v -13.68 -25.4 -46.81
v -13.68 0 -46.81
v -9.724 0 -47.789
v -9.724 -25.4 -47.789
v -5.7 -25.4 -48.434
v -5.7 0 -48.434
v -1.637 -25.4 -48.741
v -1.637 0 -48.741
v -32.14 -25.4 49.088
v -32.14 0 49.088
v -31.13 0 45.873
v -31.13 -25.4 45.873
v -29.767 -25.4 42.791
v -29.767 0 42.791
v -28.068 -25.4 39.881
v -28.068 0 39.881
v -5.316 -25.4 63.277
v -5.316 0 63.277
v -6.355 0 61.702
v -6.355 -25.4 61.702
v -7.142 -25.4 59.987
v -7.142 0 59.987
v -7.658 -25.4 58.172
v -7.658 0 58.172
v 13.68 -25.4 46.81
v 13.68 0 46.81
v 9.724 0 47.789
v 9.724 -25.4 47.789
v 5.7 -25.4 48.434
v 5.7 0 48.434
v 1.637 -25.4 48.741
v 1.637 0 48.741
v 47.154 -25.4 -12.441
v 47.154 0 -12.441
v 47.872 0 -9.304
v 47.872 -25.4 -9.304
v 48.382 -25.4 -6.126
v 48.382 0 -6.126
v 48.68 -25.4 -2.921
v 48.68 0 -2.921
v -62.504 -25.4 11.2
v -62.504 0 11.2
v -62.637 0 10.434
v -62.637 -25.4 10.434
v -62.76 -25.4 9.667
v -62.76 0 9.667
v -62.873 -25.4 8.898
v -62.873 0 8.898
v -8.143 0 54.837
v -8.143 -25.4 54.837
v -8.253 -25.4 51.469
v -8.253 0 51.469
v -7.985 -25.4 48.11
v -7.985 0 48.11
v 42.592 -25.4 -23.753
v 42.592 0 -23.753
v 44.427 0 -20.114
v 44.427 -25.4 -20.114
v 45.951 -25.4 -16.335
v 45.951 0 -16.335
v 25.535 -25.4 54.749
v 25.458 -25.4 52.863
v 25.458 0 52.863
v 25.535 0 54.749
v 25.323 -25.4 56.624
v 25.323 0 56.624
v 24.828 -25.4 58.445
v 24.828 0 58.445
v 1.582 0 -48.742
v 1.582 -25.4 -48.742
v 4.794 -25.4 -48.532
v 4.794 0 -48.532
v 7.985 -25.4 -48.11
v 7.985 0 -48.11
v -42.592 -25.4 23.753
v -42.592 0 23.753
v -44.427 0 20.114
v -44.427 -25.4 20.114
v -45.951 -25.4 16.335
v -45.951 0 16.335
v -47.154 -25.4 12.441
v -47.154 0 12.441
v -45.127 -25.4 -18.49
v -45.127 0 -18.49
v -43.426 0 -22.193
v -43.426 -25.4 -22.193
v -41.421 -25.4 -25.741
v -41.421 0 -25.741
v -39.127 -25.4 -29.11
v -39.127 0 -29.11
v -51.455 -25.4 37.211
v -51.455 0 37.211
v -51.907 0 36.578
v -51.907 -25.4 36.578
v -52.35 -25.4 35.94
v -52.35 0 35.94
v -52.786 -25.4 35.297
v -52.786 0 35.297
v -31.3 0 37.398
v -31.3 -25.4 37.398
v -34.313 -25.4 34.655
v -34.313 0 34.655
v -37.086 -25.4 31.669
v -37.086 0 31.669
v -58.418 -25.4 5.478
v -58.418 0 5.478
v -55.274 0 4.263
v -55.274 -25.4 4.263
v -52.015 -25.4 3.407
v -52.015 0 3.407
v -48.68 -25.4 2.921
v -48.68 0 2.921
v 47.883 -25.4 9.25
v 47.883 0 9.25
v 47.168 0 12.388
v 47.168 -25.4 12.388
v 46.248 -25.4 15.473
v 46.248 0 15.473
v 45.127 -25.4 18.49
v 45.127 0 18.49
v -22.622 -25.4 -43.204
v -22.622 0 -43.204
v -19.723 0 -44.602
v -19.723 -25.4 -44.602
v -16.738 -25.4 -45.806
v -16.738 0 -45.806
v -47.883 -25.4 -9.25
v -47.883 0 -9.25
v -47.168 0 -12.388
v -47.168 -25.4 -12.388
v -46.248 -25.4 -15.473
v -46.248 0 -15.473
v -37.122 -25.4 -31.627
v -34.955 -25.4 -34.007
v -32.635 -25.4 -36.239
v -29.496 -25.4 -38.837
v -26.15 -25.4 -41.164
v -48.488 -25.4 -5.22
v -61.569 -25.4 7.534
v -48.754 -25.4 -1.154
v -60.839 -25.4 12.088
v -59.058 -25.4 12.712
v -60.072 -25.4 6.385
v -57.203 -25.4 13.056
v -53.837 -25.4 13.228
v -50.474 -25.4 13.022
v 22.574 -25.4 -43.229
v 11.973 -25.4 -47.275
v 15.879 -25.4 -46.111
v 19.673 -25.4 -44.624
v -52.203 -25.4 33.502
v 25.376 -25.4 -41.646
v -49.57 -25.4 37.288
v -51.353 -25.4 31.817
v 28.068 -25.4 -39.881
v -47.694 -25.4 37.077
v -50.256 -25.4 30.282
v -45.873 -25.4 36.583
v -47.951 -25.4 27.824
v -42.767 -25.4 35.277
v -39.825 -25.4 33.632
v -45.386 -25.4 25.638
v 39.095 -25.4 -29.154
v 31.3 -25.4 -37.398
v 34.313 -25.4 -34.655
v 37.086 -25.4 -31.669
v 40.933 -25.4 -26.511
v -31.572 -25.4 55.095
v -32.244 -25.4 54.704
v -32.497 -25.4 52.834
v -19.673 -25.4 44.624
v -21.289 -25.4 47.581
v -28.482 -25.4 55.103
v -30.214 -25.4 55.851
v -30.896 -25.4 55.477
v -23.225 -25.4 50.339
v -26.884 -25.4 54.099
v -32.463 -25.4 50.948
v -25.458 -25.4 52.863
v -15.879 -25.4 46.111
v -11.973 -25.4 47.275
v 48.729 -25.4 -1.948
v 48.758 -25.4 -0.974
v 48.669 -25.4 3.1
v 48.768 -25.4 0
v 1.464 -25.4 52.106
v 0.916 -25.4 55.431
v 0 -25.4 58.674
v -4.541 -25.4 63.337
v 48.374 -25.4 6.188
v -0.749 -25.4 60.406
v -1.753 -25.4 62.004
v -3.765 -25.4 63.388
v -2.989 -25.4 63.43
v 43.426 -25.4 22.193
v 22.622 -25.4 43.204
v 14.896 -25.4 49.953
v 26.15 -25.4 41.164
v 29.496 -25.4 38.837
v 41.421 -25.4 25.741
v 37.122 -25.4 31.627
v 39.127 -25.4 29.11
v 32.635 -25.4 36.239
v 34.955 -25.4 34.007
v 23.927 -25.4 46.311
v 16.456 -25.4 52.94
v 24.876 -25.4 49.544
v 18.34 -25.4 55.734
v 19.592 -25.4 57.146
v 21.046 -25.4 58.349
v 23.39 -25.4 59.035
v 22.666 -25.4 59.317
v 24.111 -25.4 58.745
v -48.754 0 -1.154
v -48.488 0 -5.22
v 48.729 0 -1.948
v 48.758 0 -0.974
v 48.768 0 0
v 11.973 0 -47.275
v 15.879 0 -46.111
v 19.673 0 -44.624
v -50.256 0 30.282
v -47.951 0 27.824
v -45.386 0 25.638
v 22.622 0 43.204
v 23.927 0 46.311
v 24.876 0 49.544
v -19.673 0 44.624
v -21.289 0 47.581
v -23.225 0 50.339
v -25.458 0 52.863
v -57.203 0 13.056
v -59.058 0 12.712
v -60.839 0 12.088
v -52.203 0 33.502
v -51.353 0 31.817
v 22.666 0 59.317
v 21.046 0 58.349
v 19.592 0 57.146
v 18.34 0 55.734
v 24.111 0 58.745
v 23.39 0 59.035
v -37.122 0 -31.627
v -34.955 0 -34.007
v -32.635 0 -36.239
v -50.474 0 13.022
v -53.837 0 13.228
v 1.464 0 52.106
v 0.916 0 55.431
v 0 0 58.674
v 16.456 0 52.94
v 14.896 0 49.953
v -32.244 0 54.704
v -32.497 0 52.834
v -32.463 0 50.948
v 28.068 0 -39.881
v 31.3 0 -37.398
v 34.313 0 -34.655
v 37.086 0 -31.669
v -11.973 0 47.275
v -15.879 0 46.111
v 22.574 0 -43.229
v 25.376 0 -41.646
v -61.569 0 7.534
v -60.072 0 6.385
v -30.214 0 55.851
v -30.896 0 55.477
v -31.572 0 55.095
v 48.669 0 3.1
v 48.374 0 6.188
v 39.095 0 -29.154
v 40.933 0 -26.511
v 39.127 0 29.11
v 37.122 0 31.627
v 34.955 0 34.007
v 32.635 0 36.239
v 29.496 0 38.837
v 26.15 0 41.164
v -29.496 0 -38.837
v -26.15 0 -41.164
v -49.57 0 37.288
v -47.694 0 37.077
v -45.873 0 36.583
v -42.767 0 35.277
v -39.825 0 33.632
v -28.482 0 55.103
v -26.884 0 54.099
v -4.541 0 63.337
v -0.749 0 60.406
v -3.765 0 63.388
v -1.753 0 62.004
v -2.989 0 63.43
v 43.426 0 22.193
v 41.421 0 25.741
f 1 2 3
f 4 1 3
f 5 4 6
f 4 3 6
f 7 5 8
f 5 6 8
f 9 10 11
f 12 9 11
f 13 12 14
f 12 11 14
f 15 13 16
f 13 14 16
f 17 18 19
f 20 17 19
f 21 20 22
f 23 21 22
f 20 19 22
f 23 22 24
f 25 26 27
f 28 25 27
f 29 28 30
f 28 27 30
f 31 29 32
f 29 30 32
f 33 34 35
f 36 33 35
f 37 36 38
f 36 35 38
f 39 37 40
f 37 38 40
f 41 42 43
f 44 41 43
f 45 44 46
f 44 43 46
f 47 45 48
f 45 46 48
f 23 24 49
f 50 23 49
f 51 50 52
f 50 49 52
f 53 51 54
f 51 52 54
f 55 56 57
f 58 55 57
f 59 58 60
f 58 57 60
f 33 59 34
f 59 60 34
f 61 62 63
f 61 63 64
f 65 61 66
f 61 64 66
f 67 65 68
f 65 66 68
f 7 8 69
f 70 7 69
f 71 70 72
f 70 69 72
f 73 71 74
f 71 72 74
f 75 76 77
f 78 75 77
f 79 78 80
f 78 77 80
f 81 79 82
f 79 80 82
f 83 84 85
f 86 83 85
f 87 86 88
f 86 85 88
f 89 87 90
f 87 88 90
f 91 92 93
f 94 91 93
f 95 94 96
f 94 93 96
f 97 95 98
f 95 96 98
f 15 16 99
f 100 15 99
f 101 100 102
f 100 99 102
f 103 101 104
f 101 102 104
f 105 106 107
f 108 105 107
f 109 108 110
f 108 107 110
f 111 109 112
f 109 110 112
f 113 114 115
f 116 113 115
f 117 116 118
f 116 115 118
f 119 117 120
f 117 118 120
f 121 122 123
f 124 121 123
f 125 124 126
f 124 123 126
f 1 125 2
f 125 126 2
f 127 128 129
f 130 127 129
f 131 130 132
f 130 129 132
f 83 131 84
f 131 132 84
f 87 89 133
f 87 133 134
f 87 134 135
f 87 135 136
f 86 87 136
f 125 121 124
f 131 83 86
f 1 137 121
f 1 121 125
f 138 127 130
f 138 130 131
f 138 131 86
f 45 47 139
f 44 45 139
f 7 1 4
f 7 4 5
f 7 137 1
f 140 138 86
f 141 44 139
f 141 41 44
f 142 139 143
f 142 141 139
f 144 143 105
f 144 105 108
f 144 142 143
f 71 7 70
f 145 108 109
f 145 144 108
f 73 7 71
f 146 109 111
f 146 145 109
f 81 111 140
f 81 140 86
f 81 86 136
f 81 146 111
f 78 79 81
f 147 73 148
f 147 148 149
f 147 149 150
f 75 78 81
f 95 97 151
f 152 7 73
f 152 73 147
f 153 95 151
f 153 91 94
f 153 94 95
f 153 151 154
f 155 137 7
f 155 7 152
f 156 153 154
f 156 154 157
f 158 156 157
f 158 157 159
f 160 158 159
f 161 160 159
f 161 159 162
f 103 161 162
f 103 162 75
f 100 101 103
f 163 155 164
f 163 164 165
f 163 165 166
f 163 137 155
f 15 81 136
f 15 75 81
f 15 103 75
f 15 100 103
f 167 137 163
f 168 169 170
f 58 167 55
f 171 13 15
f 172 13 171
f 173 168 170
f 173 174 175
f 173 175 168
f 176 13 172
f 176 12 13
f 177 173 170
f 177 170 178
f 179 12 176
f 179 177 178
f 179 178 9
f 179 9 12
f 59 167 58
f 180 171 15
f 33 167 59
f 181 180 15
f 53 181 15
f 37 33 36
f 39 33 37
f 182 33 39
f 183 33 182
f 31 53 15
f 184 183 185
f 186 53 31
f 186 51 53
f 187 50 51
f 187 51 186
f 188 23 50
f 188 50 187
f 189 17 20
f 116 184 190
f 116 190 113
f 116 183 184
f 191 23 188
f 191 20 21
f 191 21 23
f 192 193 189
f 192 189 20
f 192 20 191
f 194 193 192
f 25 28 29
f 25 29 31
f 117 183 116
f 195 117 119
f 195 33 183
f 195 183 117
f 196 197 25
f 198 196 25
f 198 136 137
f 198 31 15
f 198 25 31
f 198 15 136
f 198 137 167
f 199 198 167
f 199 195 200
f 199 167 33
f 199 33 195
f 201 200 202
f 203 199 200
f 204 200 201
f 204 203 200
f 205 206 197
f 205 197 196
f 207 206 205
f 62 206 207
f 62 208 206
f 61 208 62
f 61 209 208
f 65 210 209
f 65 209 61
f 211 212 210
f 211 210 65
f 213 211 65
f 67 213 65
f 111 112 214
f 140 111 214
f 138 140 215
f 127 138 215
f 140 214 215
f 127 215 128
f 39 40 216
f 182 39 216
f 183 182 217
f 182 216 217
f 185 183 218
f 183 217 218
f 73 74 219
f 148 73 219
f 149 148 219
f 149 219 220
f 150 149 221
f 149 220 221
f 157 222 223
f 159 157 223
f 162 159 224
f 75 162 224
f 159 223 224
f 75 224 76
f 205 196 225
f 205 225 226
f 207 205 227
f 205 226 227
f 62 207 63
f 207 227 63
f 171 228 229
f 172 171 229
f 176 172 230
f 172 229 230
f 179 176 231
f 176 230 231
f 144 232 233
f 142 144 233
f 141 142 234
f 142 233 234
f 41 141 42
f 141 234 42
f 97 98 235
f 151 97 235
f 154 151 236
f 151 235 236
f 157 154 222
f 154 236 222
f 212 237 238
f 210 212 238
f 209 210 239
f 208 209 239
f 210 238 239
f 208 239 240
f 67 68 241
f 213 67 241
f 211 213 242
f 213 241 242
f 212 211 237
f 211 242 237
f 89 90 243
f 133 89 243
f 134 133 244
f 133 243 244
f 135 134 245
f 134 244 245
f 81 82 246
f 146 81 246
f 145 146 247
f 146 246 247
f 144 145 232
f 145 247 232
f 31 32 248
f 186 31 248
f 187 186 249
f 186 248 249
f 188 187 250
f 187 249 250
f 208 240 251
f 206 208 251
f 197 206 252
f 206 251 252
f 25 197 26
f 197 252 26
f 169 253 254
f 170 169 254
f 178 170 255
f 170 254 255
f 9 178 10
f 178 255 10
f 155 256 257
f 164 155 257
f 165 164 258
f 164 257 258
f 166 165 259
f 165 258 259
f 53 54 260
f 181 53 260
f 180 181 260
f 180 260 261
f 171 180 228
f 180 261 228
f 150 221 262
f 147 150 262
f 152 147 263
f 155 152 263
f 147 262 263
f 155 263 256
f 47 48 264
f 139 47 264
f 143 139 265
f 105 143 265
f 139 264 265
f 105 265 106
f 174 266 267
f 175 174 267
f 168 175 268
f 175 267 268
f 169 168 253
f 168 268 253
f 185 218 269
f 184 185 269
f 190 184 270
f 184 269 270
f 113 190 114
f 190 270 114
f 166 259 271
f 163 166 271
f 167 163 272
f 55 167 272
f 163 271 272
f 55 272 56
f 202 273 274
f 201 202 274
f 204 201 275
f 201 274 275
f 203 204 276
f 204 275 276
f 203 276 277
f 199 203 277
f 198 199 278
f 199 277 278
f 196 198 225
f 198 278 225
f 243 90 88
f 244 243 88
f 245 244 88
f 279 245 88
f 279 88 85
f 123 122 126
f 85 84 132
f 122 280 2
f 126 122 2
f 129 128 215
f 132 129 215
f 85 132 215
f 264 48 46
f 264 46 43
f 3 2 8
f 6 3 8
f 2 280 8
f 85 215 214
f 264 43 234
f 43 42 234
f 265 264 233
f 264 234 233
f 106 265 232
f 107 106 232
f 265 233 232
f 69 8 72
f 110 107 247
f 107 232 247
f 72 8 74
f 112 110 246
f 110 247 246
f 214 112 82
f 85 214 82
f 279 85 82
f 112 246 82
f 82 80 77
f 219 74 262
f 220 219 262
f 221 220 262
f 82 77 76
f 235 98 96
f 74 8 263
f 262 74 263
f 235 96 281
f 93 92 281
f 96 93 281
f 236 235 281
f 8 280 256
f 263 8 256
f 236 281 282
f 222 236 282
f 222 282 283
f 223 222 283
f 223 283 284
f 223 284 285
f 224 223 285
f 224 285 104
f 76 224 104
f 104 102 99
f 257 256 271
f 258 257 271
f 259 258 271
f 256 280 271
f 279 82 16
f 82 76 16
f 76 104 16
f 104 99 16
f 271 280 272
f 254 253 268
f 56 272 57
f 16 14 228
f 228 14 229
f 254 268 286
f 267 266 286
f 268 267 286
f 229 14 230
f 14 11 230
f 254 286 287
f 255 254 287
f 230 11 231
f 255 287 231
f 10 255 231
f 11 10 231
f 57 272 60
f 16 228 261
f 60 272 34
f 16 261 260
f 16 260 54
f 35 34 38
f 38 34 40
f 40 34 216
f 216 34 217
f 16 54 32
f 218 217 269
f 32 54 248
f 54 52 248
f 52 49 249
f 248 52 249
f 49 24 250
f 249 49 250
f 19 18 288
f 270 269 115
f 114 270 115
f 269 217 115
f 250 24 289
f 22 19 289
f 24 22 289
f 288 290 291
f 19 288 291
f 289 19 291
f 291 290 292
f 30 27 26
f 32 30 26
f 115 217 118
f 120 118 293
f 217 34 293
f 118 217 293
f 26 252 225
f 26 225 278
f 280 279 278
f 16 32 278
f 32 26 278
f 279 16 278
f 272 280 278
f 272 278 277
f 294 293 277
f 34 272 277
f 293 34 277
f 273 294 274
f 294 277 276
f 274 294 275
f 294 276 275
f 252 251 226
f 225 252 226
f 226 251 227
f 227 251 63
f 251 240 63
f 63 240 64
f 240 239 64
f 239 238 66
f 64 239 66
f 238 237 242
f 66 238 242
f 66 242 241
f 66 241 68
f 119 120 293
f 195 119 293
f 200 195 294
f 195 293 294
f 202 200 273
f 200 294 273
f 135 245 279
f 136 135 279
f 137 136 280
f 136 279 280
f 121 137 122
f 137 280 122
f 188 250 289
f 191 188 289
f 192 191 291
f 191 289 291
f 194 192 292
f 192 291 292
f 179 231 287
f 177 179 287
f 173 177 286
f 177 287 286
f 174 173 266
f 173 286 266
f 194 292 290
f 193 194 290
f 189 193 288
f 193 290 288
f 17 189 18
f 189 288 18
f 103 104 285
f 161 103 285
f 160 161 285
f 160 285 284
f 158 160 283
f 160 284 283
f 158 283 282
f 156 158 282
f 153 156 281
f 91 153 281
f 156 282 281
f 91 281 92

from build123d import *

# Parameters (mm, degrees)
F1_DEPTH = 25.4


with BuildPart() as f1:
    # F0 (on Front) → F1 (new body)
    with BuildSketch(Plane.XZ):
        with BuildLine():
            ThreePointArc((48.680444, -2.920995), (48.746106, -1.461153), (48.768, 0))
            ThreePointArc((48.768, 0), (48.546173, 4.646173), (47.88271, 9.250078))
            ThreePointArc((47.88271, 9.250078), (46.733738, 13.938277), (45.126937, 18.489927))
            ThreePointArc((45.126937, 18.489927), (42.460467, 23.98805), (39.127372, 29.109562))
            ThreePointArc((39.127372, 29.109562), (36.058052, 32.834962), (32.635486, 36.238693))
            ThreePointArc((32.635486, 36.238693), (27.847534, 40.035392), (22.622379, 43.203539))
            ThreePointArc((22.622379, 43.203539), (18.240626, 45.228281), (13.680177, 46.809941))
            ThreePointArc((13.680177, 46.809941), (7.719056, 48.153235), (1.636746, 48.740526))
            ThreePointArc((1.636746, 48.740526), (-3.18958, 48.663584), (-7.984658, 48.109906))
            ThreePointArc((-7.984658, 48.109906), (-13.938277, 46.733738), (-19.673065, 44.623854))
            ThreePointArc((-19.673065, 44.623854), (-23.98805, 42.460467), (-28.068034, 39.881114))
            ThreePointArc((-28.068034, 39.881114), (-32.834962, 36.058052), (-37.086384, 31.66888))
            ThreePointArc((-37.086384, 31.66888), (-40.035392, 27.847534), (-42.592192, 23.753379))
            ThreePointArc((-42.592192, 23.753379), (-45.228281, 18.240626), (-47.154289, 12.441496))
            ThreePointArc((-47.154289, 12.441496), (-48.153235, 7.719056), (-48.680444, 2.920995))
            ThreePointArc((-48.680444, 2.920995), (-48.663584, -3.18958), (-47.88271, -9.250078))
            ThreePointArc((-47.88271, -9.250078), (-46.733738, -13.938277), (-45.126937, -18.489927))
            ThreePointArc((-45.126937, -18.489927), (-42.460467, -23.98805), (-39.127372, -29.109562))
            ThreePointArc((-39.127372, -29.109562), (-36.058052, -32.834962), (-32.635486, -36.238693))
            ThreePointArc((-32.635486, -36.238693), (-27.847534, -40.035392), (-22.622379, -43.203539))
            ThreePointArc((-22.622379, -43.203539), (-18.240626, -45.228281), (-13.680177, -46.809941))
            ThreePointArc((-13.680177, -46.809941), (-7.719056, -48.153235), (-1.636746, -48.740526))
            ThreePointArc((-1.636746, -48.740526), (3.18958, -48.663584), (7.984658, -48.109906))
            ThreePointArc((7.984658, -48.109906), (13.938277, -46.733738), (19.673065, -44.623854))
            ThreePointArc((19.673065, -44.623854), (23.98805, -42.460467), (28.068034, -39.881114))
            ThreePointArc((28.068034, -39.881114), (32.834962, -36.058052), (37.086384, -31.66888))
            ThreePointArc((37.086384, -31.66888), (40.035392, -27.847534), (42.592192, -23.753379))
            ThreePointArc((42.592192, -23.753379), (45.228281, -18.240626), (47.154289, -12.441496))
            ThreePointArc((47.154289, -12.441496), (48.153235, -7.719056), (48.680444, -2.920995))
        make_face()
        with BuildLine():
            ThreePointArc((-48.680444, 2.920995), (-48.153235, 7.719056), (-47.154289, 12.441496))
            ThreePointArc((-47.154289, 12.441496), (-52.152725, 13.171914), (-57.20292, 13.056193))
            ThreePointArc((-57.20292, 13.056193), (-59.960814, 12.434145), (-62.504457, 11.200127))
            ThreePointArc((-62.504457, 11.200127), (-62.699524, 10.050854), (-62.873461, 8.898193))
            ThreePointArc((-62.873461, 8.898193), (-60.842988, 6.930936), (-58.417717, 5.478016))
            ThreePointArc((-58.417717, 5.478016), (-53.656736, 3.789545), (-48.680444, 2.920995))
        make_face()
        with BuildLine():
            ThreePointArc((-42.592192, 23.753379), (-40.035392, 27.847534), (-37.086384, 31.66888))
            ThreePointArc((-37.086384, 31.66888), (-41.272902, 34.495704), (-45.87318, 36.582641))
            ThreePointArc((-45.87318, 36.582641), (-48.627853, 37.218799), (-51.455017, 37.210634))
            ThreePointArc((-51.455017, 37.210634), (-52.129417, 36.25981), (-52.78625, 35.296768))
            ThreePointArc((-52.78625, 35.296768), (-51.810418, 32.643341), (-50.255722, 30.28202))
            ThreePointArc((-50.255722, 30.28202), (-46.698827, 26.695048), (-42.592192, 23.753379))
        make_face()
        with BuildLine():
            ThreePointArc((-28.068034, 39.881114), (-23.98805, 42.460467), (-19.673065, 44.623854))
            ThreePointArc((-19.673065, 44.623854), (-22.218475, 48.987196), (-25.457695, 52.863447))
            ThreePointArc((-25.457695, 52.863447), (-27.66355, 54.631814), (-30.214279, 55.851118))
            ThreePointArc((-30.214279, 55.851118), (-31.23444, 55.287067), (-32.244075, 54.704384))
            ThreePointArc((-32.244075, 54.704384), (-32.516159, 51.890332), (-32.139965, 49.088297))
            ThreePointArc((-32.139965, 49.088297), (-30.491642, 44.313269), (-28.068034, 39.881114))
        make_face()
        with BuildLine():
            ThreePointArc((-7.984658, 48.109906), (-3.18958, 48.663584), (1.636746, 48.740526))
            ThreePointArc((1.636746, 48.740526), (1.236594, 53.776174), (0, 58.674))
            ThreePointArc((0, 58.674), (-1.220142, 61.224328), (-2.989233, 63.429603))
            ThreePointArc((-2.989233, 63.429603), (-4.153099, 63.364042), (-5.315565, 63.277127))
            ThreePointArc((-5.315565, 63.277127), (-6.781675, 60.859806), (-7.658494, 58.172036))
            ThreePointArc((-7.658494, 58.172036), (-8.245214, 53.154703), (-7.984658, 48.109906))
        make_face()
        with BuildLine():
            ThreePointArc((13.680177, 46.809941), (18.240626, 45.228281), (22.622379, 43.203539))
            ThreePointArc((22.622379, 43.203539), (24.44674, 47.91412), (25.457695, 52.863447))
            ThreePointArc((25.457695, 52.863447), (25.464931, 55.690613), (24.827867, 58.445077))
            ThreePointArc((24.827867, 58.445077), (23.750815, 58.890991), (22.665758, 59.317058))
            ThreePointArc((22.665758, 59.317058), (20.296002, 57.775249), (18.339836, 55.734089))
            ThreePointArc((18.339836, 55.734089), (15.634281, 51.468197), (13.680177, 46.809941))
        make_face()
    extrude(amount=F1_DEPTH)


solid = f1.part
